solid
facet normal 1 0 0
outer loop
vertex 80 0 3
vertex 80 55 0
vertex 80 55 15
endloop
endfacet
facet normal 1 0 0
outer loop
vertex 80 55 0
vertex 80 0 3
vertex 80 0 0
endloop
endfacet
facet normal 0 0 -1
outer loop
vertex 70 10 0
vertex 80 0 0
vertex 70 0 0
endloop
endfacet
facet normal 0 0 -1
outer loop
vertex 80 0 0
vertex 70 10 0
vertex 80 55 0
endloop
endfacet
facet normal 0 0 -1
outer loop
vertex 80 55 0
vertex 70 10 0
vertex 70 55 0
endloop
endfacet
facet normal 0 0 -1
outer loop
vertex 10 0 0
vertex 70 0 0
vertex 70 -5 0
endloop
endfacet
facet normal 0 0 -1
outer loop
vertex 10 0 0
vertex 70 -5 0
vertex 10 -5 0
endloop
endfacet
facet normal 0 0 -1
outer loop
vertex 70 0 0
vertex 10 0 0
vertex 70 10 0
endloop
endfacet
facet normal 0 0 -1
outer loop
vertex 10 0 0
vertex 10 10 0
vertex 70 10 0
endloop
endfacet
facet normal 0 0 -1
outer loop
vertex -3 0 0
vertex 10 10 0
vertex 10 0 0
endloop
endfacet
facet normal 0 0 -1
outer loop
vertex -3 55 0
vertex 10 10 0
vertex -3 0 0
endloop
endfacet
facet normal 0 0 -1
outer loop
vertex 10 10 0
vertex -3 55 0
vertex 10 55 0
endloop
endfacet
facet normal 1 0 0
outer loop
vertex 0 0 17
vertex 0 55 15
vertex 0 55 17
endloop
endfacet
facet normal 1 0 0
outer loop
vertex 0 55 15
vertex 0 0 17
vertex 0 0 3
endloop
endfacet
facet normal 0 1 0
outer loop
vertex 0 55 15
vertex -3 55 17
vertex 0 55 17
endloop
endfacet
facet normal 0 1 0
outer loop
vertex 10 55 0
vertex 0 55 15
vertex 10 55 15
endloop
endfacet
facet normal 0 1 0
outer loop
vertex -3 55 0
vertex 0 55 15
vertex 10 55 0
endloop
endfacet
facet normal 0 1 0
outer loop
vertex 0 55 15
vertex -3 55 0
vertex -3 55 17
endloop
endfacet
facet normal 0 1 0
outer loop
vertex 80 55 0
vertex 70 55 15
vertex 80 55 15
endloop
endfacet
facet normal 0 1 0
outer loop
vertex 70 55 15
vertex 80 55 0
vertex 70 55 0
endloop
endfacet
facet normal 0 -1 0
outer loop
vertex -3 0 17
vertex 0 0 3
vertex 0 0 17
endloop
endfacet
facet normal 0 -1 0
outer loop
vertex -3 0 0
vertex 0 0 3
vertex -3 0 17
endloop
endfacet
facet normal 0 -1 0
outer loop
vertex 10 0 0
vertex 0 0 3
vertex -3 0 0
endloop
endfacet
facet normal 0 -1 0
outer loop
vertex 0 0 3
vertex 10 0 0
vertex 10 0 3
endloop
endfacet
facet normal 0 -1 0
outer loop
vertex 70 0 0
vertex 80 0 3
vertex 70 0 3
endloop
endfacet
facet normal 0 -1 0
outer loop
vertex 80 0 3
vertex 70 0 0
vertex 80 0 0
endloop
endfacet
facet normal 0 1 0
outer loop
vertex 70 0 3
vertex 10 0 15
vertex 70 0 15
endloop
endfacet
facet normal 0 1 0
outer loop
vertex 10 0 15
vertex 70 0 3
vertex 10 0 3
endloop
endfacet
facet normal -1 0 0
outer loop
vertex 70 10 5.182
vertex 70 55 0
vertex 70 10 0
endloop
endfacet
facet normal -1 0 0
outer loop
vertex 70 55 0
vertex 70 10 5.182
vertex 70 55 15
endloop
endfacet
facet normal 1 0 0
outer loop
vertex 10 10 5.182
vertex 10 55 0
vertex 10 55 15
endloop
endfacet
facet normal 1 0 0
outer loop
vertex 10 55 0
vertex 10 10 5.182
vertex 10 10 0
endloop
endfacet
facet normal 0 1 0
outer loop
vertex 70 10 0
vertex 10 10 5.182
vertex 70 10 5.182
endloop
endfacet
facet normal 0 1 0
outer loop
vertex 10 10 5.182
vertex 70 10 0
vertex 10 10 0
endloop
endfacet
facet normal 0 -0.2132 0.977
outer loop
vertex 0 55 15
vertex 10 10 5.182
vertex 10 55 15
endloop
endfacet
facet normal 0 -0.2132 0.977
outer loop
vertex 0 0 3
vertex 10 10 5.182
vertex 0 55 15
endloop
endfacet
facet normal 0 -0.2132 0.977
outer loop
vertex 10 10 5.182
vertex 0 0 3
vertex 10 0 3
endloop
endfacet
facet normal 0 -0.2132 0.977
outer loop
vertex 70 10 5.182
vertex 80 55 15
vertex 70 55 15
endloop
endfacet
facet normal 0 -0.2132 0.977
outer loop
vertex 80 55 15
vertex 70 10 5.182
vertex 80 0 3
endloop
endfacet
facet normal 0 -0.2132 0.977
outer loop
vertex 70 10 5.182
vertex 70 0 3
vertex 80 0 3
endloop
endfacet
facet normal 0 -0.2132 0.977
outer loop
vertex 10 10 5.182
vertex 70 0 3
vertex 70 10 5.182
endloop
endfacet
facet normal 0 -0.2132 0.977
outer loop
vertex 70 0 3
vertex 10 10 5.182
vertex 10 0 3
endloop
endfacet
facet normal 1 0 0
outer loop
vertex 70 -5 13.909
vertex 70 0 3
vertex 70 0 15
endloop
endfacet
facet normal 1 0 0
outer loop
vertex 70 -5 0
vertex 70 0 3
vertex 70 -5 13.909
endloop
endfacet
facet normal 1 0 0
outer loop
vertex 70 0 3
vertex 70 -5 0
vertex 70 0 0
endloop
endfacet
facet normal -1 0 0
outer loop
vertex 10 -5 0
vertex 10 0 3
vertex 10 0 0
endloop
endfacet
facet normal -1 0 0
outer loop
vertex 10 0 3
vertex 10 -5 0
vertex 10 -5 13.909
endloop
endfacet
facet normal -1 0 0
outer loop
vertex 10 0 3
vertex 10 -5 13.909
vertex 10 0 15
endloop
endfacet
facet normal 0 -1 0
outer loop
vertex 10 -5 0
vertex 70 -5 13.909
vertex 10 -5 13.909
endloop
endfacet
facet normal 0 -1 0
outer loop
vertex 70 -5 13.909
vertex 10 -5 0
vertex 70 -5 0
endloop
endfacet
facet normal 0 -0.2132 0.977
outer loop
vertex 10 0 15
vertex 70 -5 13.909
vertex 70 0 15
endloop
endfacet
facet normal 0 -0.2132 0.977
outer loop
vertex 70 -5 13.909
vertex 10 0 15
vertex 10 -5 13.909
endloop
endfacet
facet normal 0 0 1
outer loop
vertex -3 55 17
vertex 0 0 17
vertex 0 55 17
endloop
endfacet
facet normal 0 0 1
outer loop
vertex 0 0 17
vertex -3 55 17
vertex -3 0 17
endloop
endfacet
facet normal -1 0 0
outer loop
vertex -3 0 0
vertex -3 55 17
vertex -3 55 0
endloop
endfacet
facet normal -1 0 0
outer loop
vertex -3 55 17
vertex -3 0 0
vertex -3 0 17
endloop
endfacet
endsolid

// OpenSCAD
	//catan - (80,55,15)

	card_x = 80;
	card_y = 55;
	card_z = 15;
	bottom_z = 3;
	inner_offset = 10;
	top_wall_x = 3;
	top_wall_z = 17;
	side_wall_y = 5;

	tanlength = sqrt(pow(card_y,2)+pow((card_z-bottom_z),2));
	module slice() {
		translate([0,0,bottom_z])  {
			rotate([atan((card_z-bottom_z)/card_y),0,0]) {
				cube([card_x,tanlength,card_z]);
			}
		}
	}
	union(){
		difference() {
			difference() {
				cube([card_x,card_y,card_z]);
				translate([inner_offset,inner_offset,0]){
					cube([card_x-(inner_offset*2),card_y-inner_offset,card_z]);
				}			
			}
			slice();
		}
		difference(){
			translate([inner_offset,-side_wall_y,0]){
				cube([card_x-(inner_offset*2),side_wall_y,card_z]);
			}
			translate([0,-card_y,0]){
				slice();
			}
		}
		translate([-top_wall_x,0,0]){
			cube([top_wall_x,card_y,(top_wall_z)]);
		}
	}
